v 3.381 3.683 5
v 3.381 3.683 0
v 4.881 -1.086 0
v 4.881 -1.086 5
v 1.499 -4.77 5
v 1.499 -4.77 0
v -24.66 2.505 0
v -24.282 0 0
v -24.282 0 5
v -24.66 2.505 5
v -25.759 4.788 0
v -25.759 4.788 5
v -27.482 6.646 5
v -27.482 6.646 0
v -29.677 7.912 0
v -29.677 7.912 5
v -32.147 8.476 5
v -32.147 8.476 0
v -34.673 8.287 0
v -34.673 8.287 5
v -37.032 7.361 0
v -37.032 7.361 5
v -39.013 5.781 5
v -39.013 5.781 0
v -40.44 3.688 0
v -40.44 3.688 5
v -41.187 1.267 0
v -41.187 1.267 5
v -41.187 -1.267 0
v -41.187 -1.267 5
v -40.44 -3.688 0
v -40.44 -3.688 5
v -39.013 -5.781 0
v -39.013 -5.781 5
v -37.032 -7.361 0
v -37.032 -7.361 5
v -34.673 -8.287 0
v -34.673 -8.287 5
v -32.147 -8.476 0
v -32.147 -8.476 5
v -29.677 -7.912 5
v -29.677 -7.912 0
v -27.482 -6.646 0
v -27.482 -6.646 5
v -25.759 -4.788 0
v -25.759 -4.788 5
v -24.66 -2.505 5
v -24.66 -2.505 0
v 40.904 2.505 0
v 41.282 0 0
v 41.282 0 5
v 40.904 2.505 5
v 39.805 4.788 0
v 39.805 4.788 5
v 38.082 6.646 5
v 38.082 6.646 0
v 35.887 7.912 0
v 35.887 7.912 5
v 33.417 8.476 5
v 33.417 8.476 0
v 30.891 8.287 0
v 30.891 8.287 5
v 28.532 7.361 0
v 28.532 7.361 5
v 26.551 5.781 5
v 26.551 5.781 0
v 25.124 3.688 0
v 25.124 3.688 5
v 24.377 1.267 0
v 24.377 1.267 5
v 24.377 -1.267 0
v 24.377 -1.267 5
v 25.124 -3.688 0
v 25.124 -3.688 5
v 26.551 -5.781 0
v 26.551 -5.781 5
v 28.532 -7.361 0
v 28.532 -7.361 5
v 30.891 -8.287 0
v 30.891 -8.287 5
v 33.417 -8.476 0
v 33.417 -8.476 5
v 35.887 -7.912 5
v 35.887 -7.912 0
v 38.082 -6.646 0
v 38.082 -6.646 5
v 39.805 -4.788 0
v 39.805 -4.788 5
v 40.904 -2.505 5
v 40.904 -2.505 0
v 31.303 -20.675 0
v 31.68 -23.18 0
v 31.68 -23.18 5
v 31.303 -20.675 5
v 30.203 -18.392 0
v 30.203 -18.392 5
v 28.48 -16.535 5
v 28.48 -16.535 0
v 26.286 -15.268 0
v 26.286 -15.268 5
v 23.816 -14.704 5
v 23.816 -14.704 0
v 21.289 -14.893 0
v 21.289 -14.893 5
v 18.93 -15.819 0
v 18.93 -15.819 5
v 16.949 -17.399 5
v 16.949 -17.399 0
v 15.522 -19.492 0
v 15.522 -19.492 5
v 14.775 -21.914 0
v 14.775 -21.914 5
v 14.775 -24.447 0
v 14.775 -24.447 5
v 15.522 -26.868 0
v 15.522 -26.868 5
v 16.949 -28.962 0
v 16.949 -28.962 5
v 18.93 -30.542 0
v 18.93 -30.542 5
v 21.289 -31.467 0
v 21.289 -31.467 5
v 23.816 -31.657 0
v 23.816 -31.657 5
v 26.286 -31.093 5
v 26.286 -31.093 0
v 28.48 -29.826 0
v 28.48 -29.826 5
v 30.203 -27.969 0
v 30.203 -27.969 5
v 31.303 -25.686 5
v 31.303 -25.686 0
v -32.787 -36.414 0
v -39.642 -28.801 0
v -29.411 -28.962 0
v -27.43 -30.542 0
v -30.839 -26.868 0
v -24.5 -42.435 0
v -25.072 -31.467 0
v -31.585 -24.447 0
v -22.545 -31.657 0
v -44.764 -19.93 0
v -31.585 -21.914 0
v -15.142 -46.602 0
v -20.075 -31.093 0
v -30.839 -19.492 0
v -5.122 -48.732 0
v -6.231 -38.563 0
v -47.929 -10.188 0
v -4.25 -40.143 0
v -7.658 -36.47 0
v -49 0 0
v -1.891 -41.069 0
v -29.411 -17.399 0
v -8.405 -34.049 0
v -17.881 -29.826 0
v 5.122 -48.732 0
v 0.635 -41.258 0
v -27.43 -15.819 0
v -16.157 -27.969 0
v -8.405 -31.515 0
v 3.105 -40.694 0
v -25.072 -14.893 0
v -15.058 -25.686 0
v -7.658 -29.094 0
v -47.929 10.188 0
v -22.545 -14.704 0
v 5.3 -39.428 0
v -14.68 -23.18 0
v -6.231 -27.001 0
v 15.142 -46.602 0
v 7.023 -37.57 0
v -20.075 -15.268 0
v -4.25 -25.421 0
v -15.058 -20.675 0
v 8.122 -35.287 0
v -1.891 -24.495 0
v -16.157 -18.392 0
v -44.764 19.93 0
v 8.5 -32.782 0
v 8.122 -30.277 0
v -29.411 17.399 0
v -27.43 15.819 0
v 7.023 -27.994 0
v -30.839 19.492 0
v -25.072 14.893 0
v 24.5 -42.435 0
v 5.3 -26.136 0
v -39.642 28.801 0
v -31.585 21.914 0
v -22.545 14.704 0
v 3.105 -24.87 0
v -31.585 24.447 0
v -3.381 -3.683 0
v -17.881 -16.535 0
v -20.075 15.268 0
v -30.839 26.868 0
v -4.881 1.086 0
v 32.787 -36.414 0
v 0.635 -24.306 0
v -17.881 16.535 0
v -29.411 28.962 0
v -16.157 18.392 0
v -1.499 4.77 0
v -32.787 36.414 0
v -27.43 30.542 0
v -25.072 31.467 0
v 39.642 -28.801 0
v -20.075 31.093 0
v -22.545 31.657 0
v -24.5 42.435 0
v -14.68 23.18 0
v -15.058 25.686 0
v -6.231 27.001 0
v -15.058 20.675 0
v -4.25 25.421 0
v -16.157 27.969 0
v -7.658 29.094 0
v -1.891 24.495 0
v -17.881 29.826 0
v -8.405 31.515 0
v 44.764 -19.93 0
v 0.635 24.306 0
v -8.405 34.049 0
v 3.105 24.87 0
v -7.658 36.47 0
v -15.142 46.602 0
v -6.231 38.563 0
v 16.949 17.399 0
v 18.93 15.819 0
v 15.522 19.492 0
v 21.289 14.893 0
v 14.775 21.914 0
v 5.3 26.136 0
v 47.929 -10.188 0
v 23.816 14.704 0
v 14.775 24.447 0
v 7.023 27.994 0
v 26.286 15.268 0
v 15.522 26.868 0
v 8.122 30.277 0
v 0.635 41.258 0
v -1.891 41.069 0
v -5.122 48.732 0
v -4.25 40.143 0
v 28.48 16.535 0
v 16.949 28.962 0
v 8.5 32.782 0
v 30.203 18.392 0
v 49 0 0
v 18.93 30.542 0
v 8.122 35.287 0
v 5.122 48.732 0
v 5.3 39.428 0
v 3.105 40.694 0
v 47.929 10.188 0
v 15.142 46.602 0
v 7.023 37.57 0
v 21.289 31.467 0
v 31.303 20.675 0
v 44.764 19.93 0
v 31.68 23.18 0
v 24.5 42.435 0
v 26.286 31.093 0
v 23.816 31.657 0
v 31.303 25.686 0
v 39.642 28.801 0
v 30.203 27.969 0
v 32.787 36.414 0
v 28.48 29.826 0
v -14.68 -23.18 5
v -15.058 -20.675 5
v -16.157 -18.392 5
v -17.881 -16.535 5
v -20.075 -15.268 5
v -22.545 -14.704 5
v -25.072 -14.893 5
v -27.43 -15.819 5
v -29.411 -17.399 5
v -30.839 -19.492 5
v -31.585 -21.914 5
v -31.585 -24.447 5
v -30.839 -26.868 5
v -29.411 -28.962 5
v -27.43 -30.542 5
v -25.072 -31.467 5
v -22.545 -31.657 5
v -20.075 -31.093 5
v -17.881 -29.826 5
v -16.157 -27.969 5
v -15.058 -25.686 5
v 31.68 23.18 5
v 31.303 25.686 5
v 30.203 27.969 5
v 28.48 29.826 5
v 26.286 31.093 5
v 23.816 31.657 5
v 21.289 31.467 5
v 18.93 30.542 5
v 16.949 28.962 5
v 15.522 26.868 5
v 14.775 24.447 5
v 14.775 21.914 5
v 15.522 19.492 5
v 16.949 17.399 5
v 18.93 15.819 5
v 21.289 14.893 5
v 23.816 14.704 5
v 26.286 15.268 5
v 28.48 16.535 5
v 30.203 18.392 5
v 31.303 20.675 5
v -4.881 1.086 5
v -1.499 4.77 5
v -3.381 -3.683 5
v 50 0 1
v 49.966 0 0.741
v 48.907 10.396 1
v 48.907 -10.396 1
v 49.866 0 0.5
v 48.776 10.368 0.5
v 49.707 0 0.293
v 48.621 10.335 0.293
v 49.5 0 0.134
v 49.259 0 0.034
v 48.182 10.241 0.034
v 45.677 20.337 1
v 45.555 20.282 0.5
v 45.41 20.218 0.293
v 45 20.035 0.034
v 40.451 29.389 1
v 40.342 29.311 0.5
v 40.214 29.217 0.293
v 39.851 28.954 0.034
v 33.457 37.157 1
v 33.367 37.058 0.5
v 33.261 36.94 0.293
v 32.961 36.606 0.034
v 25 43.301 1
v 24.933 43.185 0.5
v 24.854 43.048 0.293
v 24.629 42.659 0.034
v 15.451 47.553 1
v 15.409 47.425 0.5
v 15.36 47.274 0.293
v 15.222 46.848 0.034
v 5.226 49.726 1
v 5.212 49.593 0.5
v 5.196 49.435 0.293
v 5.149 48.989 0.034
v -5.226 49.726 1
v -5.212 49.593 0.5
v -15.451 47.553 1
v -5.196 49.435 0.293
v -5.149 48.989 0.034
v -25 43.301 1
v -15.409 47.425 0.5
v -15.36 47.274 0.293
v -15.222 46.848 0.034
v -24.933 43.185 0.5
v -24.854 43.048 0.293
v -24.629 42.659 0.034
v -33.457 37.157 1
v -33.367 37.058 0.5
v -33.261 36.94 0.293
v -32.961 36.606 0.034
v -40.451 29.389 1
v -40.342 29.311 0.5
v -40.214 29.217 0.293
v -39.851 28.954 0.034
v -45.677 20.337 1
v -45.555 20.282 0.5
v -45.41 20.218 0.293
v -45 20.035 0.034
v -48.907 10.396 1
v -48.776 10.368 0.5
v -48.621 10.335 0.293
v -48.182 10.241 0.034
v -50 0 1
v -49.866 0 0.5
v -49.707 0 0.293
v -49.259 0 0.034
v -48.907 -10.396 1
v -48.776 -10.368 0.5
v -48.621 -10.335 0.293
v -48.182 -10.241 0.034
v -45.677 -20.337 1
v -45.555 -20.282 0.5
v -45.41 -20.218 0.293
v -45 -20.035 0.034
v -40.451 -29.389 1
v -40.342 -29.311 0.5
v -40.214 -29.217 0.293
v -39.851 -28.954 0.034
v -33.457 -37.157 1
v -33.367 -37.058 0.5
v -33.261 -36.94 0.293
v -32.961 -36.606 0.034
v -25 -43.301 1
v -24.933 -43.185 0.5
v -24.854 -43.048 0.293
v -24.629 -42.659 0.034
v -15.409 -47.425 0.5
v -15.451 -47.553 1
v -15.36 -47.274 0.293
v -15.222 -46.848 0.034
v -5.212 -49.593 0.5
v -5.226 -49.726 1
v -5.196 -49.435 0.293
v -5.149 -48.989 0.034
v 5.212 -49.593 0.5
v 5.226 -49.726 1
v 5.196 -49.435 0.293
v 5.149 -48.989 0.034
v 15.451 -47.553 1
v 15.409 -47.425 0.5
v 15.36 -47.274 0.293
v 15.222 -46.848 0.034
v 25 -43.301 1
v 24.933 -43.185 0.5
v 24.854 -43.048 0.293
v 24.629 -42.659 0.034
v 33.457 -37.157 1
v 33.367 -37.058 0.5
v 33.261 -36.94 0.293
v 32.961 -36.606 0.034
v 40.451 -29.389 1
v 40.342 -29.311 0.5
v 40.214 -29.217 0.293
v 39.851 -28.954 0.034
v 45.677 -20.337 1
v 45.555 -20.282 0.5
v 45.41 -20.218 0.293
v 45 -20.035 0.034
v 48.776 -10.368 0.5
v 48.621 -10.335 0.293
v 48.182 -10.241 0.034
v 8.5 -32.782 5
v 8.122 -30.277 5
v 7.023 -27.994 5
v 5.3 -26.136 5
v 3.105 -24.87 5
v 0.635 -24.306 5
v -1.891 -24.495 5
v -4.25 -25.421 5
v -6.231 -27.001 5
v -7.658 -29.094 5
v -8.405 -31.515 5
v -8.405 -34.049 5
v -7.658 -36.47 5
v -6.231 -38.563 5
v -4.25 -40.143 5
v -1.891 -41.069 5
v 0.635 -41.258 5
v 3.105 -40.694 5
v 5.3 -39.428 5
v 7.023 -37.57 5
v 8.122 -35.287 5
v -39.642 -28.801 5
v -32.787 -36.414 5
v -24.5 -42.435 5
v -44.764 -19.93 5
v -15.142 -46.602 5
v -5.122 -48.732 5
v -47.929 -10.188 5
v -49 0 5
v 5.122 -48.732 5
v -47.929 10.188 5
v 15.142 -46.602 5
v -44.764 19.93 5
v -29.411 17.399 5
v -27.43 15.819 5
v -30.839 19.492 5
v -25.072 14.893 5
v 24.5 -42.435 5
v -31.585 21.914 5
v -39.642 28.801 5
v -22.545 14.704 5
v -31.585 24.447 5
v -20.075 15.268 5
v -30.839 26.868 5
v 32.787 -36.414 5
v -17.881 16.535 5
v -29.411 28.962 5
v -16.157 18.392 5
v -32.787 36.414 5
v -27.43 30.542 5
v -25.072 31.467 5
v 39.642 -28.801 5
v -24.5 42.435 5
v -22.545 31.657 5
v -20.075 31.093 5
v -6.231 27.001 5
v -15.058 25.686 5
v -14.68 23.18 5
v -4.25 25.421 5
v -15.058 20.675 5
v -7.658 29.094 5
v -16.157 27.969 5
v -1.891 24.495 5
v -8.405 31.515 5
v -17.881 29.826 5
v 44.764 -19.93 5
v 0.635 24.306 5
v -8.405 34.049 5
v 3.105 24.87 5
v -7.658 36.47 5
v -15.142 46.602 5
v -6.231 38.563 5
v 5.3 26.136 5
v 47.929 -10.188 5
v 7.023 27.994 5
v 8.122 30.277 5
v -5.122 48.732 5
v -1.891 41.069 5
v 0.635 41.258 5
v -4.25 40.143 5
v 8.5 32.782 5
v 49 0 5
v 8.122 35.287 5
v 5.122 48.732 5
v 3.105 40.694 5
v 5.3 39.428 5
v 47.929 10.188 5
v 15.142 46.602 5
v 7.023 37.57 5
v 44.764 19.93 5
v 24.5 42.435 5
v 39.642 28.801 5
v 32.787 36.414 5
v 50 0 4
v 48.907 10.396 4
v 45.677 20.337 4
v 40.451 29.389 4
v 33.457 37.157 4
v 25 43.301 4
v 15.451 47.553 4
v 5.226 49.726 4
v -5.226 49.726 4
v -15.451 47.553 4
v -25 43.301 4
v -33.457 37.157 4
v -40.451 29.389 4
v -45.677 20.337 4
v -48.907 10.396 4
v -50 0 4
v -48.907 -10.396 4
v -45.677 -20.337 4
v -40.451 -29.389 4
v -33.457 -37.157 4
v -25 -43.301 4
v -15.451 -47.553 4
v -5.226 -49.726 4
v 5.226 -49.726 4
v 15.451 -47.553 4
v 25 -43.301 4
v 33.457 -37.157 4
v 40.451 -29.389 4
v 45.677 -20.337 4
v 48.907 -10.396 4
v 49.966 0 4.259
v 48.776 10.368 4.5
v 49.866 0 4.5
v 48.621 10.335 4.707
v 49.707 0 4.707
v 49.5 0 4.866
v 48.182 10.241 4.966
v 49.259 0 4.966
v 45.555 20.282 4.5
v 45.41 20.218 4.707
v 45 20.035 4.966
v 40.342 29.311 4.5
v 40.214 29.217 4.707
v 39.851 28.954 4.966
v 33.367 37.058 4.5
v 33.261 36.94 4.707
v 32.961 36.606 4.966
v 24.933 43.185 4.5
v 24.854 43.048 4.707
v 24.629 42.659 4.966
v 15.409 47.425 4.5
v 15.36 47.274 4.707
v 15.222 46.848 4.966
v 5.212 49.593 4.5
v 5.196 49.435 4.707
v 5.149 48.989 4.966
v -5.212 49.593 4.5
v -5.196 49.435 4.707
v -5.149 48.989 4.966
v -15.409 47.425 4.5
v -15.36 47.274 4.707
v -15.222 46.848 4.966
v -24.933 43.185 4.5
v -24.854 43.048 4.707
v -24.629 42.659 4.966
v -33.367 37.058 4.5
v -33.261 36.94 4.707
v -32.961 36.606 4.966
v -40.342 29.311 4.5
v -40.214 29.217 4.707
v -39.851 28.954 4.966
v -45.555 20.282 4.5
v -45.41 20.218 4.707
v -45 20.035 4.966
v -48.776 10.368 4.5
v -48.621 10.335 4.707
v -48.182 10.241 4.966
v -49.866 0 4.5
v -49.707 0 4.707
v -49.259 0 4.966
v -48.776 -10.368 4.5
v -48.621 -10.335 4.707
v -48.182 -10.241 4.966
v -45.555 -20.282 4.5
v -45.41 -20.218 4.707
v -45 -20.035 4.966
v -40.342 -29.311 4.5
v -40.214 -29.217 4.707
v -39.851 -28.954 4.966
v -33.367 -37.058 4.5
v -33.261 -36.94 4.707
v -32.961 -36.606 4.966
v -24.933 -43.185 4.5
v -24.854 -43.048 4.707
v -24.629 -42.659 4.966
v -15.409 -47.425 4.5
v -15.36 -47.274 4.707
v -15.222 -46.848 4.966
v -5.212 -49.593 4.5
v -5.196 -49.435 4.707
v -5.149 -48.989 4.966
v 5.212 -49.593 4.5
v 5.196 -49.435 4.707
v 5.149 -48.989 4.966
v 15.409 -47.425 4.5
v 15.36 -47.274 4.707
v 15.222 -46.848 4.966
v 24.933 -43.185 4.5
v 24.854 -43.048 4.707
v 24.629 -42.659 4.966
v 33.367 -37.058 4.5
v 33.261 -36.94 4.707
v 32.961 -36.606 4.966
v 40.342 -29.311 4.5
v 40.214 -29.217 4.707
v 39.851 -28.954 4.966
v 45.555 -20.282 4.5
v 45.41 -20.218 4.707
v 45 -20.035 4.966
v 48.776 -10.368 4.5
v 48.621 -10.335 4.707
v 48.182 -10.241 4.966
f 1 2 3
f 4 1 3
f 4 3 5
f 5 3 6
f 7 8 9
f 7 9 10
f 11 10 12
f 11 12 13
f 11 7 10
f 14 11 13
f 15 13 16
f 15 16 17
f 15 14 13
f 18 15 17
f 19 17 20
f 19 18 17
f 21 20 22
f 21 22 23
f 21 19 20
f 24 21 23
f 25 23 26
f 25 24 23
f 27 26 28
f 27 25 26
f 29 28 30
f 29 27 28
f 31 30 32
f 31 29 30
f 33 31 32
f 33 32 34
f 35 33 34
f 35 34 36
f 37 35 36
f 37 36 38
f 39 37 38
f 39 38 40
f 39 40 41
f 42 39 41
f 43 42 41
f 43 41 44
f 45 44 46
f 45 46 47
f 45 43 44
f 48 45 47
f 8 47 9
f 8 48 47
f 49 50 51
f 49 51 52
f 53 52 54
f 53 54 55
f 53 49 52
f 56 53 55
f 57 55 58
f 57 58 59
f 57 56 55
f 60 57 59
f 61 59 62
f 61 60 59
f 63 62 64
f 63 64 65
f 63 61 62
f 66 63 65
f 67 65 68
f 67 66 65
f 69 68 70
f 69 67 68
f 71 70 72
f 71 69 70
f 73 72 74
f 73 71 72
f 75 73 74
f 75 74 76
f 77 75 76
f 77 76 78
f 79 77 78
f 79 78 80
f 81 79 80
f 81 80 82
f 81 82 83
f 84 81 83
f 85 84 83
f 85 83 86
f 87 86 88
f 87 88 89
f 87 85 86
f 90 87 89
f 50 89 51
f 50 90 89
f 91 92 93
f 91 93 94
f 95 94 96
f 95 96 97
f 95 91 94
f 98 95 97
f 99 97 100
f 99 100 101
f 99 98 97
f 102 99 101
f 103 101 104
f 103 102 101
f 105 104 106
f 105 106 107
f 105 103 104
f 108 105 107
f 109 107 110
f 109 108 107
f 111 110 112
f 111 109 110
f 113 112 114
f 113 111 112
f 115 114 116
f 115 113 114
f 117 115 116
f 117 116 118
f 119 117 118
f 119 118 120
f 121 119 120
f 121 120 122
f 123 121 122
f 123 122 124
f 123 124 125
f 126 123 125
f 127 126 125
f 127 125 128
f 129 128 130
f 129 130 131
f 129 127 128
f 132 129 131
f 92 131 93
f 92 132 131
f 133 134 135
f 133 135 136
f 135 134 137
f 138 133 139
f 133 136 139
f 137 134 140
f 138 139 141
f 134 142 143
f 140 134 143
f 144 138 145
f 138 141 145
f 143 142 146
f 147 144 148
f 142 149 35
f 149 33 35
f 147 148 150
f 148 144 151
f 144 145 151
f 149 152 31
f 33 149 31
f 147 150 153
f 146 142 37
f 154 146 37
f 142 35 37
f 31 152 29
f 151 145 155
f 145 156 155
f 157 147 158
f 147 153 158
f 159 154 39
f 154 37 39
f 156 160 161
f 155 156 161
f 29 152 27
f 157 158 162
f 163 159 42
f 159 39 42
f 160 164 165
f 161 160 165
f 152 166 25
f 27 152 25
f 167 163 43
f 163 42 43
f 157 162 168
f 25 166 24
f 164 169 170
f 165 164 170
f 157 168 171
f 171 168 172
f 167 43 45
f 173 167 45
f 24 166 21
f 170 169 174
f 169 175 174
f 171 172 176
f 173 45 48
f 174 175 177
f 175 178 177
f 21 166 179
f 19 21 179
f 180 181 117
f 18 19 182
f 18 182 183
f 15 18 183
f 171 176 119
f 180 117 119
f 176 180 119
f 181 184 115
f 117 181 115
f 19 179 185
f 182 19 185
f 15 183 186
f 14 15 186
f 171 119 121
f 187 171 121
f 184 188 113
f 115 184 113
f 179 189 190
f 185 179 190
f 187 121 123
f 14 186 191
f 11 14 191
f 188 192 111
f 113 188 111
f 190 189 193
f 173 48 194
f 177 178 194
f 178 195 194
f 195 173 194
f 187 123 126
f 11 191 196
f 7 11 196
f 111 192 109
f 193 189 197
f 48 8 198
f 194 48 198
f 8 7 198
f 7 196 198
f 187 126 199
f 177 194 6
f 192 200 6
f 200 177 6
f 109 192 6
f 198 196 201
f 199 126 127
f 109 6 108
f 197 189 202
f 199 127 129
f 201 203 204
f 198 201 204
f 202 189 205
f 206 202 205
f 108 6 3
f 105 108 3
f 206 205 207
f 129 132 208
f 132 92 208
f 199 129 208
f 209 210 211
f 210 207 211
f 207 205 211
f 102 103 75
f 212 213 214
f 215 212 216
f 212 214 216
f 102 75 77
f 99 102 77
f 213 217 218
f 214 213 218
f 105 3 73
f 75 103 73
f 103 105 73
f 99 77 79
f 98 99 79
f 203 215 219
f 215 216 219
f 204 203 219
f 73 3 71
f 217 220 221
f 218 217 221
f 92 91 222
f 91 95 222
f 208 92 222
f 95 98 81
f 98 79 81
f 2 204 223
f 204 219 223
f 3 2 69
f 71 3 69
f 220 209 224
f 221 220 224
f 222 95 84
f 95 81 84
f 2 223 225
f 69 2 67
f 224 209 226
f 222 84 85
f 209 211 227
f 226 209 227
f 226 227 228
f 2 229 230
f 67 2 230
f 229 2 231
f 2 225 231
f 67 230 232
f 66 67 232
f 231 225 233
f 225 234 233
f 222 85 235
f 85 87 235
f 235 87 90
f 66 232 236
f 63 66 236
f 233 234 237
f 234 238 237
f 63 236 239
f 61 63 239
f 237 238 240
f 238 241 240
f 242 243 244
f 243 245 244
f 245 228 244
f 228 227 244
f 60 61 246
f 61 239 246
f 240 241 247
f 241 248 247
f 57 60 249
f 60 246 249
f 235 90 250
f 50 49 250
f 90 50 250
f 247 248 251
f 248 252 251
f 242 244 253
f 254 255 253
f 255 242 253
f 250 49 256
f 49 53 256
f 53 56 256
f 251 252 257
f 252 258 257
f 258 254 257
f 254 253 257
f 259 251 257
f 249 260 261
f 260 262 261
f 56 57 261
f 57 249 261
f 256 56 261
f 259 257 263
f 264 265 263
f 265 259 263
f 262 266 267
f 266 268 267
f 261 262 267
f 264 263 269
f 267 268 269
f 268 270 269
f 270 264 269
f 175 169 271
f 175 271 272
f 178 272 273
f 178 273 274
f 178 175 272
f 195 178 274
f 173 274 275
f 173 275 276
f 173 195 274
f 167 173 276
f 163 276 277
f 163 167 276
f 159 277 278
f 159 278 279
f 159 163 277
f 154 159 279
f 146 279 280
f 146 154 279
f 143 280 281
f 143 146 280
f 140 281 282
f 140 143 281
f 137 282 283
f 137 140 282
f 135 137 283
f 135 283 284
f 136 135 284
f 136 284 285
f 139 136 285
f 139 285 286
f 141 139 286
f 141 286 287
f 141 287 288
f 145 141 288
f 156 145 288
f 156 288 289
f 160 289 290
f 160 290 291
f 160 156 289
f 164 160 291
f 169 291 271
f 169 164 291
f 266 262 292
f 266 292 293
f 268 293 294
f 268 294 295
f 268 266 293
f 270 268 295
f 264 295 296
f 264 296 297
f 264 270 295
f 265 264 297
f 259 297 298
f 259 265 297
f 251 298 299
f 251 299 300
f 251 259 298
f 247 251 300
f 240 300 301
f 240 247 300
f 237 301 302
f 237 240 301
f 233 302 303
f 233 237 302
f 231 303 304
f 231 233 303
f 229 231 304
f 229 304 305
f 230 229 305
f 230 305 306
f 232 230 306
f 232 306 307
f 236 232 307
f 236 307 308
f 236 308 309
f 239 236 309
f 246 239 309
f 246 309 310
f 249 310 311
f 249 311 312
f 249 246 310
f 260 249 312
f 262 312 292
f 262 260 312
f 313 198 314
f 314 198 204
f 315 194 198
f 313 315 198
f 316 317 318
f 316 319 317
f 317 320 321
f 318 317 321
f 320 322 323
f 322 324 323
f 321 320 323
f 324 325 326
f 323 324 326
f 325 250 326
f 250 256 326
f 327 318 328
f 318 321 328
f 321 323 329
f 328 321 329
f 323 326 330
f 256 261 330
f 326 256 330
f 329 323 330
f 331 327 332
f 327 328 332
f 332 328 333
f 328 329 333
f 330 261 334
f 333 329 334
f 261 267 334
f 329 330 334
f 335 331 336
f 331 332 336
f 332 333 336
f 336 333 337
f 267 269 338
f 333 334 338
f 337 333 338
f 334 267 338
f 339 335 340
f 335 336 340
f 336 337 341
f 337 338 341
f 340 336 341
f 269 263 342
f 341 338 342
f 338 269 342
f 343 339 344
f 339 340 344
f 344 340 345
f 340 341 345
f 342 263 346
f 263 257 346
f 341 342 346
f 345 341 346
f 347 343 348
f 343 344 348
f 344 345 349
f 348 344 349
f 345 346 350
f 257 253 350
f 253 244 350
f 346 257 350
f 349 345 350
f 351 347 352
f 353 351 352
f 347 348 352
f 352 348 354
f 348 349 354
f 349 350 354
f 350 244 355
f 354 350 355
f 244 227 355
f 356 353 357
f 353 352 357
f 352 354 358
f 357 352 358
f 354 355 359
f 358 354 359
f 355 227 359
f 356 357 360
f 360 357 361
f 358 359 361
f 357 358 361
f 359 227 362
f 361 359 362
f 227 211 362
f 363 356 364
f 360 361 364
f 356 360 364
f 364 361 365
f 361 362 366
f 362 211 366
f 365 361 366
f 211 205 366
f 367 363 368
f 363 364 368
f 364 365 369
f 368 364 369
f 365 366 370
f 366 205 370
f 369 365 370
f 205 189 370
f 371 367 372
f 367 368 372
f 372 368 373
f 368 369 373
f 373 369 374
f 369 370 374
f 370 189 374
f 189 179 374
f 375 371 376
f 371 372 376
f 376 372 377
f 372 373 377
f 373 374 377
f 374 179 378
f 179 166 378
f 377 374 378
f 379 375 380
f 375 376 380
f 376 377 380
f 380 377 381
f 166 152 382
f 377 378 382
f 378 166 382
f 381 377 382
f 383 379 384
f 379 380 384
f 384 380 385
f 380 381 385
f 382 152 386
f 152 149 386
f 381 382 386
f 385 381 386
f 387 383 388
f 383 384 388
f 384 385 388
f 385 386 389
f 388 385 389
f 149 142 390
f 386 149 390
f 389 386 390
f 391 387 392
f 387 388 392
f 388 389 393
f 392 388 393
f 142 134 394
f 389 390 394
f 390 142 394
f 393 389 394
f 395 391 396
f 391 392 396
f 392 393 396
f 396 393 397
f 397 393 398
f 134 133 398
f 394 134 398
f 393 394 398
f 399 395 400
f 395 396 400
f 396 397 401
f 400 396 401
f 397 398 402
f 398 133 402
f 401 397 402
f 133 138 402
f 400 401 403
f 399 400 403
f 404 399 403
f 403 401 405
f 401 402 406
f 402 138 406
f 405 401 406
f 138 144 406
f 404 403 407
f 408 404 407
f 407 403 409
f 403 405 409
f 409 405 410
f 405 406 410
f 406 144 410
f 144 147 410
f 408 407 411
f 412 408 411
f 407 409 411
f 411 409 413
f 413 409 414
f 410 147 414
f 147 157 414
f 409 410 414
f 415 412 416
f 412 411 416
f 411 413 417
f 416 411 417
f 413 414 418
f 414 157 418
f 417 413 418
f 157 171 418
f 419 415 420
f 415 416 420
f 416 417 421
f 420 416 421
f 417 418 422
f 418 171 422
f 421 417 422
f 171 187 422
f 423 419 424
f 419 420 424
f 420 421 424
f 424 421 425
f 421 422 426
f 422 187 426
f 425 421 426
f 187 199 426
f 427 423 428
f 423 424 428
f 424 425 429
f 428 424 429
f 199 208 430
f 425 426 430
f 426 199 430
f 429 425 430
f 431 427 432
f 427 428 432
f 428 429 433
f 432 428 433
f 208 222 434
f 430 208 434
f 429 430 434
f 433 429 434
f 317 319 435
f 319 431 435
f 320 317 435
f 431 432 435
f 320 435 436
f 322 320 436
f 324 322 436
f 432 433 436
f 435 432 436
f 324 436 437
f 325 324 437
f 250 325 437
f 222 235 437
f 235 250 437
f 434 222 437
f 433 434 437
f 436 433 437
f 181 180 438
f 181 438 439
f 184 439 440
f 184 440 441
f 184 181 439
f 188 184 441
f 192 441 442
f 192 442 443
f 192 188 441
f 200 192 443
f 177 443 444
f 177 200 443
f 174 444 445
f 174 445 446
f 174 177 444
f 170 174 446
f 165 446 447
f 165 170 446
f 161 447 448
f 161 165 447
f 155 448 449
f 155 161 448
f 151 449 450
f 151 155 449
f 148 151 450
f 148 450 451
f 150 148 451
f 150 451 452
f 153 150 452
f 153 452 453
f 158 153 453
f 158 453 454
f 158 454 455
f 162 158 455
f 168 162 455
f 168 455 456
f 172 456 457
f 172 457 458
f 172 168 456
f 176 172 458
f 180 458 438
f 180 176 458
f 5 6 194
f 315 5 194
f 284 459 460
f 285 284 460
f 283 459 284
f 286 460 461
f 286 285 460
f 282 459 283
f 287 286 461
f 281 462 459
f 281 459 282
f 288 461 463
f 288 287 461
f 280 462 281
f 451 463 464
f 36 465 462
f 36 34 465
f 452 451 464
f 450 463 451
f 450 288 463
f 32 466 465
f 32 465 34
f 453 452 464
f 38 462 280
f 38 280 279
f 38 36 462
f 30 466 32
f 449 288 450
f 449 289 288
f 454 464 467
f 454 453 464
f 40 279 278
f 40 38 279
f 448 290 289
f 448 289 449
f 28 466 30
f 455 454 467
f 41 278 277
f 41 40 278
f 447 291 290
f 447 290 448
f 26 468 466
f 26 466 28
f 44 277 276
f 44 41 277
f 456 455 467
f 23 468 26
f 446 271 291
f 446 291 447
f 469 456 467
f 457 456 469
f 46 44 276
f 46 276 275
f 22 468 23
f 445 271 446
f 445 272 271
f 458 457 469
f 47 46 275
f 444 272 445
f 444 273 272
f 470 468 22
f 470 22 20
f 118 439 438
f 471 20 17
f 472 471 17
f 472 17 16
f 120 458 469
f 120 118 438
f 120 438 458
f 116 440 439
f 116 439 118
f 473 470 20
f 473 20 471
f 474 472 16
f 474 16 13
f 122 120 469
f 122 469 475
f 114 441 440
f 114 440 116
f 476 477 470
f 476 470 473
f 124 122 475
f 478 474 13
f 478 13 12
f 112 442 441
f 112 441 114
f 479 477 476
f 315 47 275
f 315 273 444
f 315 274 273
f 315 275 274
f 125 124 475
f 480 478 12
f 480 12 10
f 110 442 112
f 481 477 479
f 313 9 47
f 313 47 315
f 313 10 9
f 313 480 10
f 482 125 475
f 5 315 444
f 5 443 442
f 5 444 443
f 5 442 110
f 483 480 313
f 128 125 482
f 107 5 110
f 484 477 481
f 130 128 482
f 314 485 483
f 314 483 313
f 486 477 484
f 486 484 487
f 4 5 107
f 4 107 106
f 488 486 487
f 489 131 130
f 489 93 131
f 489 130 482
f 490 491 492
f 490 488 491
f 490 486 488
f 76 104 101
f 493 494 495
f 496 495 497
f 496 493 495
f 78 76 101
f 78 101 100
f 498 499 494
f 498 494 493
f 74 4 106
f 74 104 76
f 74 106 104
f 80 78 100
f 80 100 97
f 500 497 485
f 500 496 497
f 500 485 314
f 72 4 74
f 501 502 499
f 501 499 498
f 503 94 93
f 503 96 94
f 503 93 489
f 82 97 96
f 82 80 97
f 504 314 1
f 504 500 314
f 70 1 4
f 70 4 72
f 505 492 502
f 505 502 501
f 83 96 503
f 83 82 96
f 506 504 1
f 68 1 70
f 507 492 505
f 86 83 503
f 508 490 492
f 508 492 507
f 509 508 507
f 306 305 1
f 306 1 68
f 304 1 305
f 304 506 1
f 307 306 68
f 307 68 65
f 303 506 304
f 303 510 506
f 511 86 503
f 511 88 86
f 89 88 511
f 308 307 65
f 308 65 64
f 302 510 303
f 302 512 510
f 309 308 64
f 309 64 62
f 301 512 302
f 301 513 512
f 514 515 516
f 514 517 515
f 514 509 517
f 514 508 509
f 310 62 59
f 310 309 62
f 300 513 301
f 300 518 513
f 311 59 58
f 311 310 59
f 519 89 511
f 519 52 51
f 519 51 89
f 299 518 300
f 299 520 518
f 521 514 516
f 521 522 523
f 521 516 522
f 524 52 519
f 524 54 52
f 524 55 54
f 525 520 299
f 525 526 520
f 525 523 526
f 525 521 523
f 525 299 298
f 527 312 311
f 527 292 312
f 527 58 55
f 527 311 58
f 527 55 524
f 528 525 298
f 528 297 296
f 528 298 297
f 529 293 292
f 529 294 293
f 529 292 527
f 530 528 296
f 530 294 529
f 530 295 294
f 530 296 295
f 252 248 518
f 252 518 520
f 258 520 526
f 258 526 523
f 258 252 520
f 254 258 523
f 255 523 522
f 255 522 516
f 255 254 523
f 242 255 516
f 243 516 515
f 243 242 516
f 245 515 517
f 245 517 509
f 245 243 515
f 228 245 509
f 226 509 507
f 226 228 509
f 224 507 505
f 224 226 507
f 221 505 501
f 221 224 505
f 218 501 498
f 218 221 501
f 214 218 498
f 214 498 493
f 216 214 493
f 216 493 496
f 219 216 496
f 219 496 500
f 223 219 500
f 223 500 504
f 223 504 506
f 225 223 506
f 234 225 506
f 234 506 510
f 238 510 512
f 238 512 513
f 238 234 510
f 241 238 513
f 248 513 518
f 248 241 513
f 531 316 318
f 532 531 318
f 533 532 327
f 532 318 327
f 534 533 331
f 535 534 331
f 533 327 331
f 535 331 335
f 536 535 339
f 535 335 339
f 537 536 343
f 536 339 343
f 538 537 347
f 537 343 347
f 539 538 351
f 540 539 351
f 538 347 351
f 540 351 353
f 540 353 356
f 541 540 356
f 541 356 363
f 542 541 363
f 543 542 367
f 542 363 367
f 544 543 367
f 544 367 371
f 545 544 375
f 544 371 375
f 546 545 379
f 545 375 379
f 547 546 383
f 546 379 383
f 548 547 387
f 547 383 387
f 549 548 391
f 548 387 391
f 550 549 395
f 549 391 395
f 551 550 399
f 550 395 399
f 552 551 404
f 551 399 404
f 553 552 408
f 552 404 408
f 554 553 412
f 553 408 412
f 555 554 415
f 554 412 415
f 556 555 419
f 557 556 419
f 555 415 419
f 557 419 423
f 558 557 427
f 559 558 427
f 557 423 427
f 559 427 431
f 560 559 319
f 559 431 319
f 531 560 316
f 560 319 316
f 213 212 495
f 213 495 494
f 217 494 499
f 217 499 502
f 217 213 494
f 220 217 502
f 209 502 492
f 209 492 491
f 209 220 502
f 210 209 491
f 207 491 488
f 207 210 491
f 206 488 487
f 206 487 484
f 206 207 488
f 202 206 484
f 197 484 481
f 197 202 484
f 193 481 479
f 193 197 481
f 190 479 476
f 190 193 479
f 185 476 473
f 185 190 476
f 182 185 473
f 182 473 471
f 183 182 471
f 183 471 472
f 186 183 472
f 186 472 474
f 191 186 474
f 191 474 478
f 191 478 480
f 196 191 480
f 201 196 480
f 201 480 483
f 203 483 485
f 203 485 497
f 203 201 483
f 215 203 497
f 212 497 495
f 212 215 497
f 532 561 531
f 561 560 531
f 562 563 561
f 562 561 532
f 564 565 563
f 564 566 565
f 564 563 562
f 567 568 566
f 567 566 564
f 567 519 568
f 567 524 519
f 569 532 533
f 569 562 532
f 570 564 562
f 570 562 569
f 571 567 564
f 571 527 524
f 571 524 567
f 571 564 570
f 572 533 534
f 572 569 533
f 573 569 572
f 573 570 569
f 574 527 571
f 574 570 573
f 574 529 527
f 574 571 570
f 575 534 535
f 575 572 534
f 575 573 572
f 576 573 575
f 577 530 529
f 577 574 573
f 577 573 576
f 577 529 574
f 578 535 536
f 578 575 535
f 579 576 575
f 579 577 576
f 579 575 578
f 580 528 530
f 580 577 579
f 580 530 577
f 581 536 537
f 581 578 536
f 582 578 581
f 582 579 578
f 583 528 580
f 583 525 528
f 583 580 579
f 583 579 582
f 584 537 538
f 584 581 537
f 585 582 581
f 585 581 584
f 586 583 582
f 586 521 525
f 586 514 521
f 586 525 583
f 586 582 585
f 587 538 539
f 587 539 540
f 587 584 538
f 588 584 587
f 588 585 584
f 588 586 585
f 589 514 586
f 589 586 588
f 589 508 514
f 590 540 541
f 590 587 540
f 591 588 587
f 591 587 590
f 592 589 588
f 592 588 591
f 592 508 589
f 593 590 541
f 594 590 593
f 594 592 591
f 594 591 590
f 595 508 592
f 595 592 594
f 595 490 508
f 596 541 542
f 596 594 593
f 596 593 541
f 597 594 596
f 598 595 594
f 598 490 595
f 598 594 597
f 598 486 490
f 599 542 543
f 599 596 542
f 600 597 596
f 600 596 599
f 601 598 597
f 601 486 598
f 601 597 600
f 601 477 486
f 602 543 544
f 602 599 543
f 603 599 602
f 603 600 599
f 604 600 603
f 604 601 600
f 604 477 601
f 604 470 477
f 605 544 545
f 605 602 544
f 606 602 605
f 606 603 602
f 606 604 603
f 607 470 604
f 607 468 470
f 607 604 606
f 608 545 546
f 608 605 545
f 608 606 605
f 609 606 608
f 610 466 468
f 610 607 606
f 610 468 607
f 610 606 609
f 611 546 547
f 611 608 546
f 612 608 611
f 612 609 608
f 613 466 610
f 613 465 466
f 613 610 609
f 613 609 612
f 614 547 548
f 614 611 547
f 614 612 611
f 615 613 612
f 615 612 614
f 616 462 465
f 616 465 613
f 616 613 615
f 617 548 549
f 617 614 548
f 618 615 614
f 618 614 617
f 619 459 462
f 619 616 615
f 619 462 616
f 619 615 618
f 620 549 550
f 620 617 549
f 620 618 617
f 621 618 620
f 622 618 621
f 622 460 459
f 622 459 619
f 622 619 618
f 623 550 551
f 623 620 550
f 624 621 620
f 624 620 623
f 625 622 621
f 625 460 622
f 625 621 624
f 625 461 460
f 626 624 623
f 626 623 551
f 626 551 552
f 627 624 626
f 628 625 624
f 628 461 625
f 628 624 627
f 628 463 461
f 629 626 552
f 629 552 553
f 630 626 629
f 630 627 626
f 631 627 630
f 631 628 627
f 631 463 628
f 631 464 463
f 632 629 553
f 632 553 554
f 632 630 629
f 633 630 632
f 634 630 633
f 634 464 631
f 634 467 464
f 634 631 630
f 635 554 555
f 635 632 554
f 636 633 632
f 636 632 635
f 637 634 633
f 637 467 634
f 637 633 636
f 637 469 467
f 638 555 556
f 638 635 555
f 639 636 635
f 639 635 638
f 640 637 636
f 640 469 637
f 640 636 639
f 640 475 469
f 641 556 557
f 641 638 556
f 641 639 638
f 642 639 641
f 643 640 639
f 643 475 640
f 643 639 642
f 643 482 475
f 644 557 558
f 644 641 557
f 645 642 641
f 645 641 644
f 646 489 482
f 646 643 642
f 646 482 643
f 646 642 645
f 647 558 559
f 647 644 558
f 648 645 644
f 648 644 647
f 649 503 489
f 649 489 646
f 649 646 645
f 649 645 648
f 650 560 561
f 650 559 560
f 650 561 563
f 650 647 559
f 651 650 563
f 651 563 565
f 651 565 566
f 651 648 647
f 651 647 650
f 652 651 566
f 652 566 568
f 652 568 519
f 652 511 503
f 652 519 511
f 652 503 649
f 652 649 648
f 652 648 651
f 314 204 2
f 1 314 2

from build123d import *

# Parameters (mm, degrees)
F0_R     = 50
F0_R_2   = 8.5
F1_DEPTH = 5
F2_R     = 1


with BuildPart() as f1:
    # F0 (on Top) → F1 (new body)
    with BuildSketch(Plane.XY):
        Circle(F0_R)
        with Locations((-23.180378, -23.180378)):
            Circle(F0_R_2, mode=Mode.SUBTRACT)
        with Locations((0, -32.782005)):
            Circle(F0_R_2, mode=Mode.SUBTRACT)
        with Locations((23.180378, -23.180378)):
            Circle(F0_R_2, mode=Mode.SUBTRACT)
        with Locations((-32.782005, 0)):
            Circle(F0_R_2, mode=Mode.SUBTRACT)
        with Locations((-23.180378, 23.180378)):
            Circle(F0_R_2, mode=Mode.SUBTRACT)
        Polygon((3.381157, 3.683446), (4.880537, -1.086445), (1.499379, -4.769891), (-3.381157, -3.683446), (-4.880537, 1.086445), (-1.499379, 4.769891), align=None, mode=Mode.SUBTRACT)
        with Locations((23.180378, 23.180378)):
            Circle(F0_R_2, mode=Mode.SUBTRACT)
        with Locations((32.782005, 0)):
            Circle(F0_R_2, mode=Mode.SUBTRACT)
        with Locations((0, 32.782005)):
            Circle(F0_R_2, mode=Mode.SUBTRACT)
    extrude(amount=F1_DEPTH)

    # F2
    f2_edges = [f1.edges().sort_by_distance(p)[0] for p in [
        (-50, 0, 5),
        (-50, 0, 0),
    ]]
    fillet(f2_edges, radius=F2_R)


solid = f1.part
